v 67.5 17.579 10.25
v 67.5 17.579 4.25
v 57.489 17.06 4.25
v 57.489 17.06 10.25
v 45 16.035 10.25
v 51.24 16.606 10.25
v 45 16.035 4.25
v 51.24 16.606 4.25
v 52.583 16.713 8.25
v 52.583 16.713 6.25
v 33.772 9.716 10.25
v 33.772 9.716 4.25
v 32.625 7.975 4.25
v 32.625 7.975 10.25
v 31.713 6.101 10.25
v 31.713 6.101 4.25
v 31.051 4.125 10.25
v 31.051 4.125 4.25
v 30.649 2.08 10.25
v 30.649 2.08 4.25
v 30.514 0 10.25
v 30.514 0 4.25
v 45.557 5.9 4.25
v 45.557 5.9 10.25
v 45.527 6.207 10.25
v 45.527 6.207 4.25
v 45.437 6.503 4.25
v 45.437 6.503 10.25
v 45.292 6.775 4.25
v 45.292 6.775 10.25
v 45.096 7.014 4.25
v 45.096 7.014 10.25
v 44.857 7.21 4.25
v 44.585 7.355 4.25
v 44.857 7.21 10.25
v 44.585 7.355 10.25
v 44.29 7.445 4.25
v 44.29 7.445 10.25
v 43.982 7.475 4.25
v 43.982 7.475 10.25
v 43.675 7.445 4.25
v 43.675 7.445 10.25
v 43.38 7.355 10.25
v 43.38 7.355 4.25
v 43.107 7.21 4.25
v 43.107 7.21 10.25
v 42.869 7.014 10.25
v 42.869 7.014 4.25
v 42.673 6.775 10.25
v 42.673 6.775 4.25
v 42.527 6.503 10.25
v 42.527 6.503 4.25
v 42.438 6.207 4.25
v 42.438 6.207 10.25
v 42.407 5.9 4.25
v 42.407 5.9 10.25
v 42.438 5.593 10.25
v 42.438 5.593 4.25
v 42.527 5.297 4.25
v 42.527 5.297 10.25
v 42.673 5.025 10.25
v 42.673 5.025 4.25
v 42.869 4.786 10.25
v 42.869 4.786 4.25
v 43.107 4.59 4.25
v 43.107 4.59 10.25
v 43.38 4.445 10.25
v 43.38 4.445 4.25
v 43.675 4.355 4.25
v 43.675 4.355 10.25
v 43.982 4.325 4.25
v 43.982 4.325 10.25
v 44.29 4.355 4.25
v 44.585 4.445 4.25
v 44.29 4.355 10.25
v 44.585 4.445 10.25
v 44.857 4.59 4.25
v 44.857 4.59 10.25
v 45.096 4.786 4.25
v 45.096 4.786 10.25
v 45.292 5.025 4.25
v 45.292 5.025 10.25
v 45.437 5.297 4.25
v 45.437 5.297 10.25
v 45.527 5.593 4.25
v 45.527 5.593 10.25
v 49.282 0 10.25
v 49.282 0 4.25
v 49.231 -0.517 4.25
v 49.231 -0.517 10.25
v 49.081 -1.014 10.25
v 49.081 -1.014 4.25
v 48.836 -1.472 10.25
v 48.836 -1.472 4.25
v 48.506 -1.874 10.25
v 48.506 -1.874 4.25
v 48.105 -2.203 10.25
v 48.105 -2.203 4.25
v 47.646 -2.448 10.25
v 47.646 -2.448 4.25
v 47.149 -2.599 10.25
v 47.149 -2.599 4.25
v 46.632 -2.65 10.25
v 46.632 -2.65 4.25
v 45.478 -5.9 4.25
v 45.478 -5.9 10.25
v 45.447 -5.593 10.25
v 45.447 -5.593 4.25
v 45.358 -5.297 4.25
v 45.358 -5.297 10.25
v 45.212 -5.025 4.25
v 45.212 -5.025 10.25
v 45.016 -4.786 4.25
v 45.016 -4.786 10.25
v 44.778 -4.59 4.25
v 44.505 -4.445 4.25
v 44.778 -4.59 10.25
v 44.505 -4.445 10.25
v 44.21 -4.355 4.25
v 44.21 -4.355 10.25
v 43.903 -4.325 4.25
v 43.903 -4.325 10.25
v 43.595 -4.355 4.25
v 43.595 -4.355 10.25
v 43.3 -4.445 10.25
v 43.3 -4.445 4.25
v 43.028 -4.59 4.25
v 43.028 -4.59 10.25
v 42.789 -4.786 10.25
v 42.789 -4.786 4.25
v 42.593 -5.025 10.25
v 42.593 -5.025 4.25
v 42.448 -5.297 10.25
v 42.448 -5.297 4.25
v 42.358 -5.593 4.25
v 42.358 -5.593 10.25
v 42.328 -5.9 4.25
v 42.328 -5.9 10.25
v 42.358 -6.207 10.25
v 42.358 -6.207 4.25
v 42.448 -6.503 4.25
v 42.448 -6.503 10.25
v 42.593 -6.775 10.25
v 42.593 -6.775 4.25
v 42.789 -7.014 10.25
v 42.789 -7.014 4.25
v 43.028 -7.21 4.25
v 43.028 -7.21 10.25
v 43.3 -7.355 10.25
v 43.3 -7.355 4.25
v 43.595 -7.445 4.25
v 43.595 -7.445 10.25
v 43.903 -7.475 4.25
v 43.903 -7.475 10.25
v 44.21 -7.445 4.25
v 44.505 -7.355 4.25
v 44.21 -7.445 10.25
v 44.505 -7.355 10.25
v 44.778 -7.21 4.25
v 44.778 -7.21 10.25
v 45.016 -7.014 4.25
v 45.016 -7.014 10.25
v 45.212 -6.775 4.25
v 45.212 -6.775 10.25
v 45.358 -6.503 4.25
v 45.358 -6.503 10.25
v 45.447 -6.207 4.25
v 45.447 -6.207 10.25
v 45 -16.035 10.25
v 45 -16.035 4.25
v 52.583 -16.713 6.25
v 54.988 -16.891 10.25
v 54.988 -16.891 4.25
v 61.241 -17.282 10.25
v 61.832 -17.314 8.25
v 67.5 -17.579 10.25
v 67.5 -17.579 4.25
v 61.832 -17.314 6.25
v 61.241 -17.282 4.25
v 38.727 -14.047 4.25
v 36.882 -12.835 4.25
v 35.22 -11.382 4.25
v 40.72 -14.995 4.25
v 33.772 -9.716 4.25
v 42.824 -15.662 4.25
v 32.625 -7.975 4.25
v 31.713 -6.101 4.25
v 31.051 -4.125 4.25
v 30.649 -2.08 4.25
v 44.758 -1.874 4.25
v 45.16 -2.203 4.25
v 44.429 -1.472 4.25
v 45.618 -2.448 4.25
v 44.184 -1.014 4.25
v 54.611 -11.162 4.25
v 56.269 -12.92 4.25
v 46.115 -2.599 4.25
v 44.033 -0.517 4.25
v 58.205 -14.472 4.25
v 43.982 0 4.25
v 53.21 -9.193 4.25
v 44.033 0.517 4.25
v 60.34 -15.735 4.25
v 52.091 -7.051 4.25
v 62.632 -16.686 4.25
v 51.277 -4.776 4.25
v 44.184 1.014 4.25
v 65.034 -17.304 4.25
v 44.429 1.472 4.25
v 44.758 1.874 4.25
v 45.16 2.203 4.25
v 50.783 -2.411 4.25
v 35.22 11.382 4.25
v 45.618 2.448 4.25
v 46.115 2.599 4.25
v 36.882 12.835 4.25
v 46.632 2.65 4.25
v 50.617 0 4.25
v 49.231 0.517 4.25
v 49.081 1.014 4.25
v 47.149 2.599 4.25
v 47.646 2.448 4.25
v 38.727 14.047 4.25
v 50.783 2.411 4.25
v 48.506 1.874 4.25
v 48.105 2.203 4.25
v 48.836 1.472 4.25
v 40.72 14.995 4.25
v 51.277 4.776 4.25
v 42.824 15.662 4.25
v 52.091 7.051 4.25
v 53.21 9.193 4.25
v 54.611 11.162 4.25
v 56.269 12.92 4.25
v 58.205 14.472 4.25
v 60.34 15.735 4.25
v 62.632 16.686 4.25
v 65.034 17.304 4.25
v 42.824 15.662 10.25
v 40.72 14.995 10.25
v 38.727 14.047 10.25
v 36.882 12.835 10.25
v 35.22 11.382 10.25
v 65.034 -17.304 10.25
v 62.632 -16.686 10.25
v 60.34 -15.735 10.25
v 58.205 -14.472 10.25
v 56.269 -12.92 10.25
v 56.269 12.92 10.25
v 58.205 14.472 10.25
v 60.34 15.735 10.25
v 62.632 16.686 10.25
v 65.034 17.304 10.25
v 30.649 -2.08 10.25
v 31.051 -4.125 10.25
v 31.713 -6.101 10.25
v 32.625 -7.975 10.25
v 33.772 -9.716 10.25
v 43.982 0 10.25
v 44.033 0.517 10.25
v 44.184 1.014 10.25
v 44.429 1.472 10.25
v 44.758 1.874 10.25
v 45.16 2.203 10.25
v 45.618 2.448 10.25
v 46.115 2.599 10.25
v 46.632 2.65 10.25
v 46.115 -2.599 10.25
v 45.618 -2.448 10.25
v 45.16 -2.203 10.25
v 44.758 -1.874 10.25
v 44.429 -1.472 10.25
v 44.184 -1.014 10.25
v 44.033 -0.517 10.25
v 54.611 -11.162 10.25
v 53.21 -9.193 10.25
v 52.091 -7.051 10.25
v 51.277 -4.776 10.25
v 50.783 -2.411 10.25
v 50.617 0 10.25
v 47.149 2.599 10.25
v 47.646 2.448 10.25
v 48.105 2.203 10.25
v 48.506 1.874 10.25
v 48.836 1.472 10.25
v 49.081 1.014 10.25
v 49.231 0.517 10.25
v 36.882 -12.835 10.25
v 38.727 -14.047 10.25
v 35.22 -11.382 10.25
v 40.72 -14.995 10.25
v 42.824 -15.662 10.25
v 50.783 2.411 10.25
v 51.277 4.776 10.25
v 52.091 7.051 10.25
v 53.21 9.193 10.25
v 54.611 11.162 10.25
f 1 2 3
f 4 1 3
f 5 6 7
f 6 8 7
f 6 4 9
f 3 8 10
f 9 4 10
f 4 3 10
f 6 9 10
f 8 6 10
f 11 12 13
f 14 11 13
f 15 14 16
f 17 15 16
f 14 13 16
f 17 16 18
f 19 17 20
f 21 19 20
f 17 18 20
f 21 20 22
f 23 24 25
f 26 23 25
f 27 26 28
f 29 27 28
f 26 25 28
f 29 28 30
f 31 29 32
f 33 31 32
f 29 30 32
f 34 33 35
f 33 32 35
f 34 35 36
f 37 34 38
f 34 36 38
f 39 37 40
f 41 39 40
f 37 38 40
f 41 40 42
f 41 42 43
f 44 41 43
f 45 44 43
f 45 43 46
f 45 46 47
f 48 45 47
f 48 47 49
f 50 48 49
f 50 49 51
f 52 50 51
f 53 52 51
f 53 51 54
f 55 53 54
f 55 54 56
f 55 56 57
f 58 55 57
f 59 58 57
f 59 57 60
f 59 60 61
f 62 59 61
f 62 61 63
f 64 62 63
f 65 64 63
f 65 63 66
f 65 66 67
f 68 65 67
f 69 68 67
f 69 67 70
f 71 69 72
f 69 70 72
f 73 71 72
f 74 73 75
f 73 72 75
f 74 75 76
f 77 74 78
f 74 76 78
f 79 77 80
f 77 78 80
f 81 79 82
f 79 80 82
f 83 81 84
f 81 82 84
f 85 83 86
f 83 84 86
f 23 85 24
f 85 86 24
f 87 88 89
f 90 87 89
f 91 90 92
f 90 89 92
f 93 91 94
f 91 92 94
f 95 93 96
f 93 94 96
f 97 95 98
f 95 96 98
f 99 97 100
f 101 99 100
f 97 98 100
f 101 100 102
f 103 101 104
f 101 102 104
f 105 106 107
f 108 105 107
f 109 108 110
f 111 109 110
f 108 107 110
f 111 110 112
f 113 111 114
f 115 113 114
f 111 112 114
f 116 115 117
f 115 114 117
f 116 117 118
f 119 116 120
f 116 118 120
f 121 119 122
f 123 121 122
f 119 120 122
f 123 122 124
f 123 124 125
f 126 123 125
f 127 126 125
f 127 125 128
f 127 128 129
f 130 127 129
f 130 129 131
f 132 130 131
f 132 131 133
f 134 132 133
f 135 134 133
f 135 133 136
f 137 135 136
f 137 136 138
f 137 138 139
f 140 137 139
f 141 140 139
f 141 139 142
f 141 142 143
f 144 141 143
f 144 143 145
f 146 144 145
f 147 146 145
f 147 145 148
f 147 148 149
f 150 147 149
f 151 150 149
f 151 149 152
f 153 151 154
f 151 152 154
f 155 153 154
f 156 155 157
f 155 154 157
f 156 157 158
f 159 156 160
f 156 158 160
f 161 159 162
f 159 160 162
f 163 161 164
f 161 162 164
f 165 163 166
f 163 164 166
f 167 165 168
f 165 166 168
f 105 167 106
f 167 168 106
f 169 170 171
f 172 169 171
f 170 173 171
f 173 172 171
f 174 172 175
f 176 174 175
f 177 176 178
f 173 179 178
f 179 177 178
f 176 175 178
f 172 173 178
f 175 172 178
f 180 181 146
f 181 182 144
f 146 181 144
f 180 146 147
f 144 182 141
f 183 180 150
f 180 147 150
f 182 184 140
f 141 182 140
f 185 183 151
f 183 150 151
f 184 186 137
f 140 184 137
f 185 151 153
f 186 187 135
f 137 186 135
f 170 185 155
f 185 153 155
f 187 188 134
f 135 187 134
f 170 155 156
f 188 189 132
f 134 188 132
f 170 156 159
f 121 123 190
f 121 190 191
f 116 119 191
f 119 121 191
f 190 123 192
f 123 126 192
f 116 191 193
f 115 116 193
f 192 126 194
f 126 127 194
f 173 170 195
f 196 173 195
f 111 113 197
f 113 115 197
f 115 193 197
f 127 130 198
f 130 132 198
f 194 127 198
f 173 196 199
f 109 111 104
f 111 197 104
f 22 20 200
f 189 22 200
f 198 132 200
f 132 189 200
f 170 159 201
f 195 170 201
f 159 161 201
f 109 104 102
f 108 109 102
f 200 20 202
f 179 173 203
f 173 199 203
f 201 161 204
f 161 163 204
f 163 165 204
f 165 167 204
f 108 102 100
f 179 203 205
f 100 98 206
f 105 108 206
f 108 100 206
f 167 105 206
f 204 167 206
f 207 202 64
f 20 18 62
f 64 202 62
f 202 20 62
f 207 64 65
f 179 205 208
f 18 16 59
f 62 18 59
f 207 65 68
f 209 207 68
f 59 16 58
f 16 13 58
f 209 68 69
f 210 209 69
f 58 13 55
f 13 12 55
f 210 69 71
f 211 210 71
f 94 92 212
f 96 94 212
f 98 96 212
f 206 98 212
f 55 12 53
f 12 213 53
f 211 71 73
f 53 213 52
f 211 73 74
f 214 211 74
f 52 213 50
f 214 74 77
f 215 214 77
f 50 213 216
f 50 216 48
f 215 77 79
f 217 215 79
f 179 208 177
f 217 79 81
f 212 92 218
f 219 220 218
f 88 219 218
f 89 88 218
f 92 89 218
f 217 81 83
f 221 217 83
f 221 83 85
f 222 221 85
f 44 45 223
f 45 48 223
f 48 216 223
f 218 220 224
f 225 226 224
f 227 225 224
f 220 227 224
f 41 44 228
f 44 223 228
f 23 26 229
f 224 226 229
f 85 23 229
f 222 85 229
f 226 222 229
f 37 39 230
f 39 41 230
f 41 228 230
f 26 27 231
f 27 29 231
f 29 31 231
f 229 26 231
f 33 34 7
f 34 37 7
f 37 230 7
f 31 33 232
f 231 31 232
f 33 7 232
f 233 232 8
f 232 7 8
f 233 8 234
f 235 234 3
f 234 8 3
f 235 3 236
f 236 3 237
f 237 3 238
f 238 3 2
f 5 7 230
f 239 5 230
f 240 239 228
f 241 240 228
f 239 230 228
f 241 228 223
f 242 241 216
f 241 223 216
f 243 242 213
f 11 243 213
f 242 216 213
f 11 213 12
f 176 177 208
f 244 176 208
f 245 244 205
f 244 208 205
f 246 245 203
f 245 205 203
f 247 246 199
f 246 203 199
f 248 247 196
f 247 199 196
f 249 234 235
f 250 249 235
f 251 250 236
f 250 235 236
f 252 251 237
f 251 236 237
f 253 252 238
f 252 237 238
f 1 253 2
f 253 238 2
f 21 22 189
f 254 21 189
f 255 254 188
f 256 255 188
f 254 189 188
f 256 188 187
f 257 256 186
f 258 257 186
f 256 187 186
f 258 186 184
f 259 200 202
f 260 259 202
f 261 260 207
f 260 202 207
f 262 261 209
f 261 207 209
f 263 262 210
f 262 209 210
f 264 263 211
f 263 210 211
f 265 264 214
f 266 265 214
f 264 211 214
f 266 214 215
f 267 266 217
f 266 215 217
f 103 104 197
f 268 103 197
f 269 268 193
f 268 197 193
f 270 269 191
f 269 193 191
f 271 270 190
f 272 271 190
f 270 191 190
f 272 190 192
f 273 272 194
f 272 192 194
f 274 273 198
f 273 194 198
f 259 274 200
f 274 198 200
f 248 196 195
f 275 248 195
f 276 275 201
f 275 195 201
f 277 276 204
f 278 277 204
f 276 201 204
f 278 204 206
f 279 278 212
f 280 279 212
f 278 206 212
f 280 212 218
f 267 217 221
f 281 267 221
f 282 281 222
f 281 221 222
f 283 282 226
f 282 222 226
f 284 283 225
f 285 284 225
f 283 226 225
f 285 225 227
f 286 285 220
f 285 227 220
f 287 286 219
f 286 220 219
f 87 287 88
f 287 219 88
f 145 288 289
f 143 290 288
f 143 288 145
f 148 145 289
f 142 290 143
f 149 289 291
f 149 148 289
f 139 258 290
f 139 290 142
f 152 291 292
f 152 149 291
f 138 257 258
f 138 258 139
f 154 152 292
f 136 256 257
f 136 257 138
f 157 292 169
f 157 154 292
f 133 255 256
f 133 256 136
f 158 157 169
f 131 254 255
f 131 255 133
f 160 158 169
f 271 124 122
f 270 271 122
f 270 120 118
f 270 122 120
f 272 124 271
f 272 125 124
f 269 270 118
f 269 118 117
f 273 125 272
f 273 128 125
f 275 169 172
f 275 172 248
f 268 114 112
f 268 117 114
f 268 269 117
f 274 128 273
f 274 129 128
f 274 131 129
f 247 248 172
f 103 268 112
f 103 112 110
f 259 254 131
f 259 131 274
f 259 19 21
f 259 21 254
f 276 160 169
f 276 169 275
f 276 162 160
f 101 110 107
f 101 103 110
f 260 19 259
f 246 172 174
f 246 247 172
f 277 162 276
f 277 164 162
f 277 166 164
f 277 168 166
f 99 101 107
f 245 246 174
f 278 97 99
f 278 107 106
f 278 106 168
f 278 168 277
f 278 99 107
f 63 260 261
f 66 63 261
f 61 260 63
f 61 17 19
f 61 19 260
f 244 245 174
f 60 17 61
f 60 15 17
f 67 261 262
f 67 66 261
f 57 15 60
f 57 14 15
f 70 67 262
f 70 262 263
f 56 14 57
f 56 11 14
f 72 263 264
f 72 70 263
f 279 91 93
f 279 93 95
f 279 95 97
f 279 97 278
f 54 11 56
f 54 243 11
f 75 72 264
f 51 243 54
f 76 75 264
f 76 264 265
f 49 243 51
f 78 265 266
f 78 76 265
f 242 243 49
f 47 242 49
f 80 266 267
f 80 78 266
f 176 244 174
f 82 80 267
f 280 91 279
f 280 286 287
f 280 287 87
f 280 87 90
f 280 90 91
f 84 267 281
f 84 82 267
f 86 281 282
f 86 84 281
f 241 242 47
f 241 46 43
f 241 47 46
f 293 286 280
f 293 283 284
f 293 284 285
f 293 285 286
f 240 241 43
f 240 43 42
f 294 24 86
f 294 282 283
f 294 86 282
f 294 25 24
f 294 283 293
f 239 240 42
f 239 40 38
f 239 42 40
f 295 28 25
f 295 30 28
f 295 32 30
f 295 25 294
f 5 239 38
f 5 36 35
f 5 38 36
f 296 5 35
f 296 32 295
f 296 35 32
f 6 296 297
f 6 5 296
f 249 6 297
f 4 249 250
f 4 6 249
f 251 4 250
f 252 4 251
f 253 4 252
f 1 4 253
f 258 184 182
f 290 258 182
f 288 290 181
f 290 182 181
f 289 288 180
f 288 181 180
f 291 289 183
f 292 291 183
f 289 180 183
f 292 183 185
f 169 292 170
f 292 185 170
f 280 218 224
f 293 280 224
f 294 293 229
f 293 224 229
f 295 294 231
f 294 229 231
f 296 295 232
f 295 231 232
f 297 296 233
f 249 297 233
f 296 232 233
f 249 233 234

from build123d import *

# Parameters (mm, degrees)
BOSS_EXTRUDE3_START = 4.25
BOSS_EXTRUDE3_DEPTH = 6
SKETCH3_R           = 1.575
CUT_EXTRUDE1_DEPTH  = 10


with BuildPart() as part:
    # Sketch2 → Boss-Extrude3 (new body)
    with BuildSketch(Plane.XY.offset(BOSS_EXTRUDE3_START)):
        with BuildLine():
            ThreePointArc((46.632238895, 16.118255038), (45.815068573, 16.097527081), (45, 16.035396523))
            ThreePointArc((45, 16.035396523), (38.72701102, 14.046548248), (33.771749201, 9.716272448))
            ThreePointArc((33.771749201, 9.716272448), (37.029755518, 5.335725192), (38.184673742, 0))
            Line((38.184673742, 0), (43.982238895, 0))
            ThreePointArc((43.982238895, 0), (44.758405925, 1.87383297), (46.632238895, 2.65))
            Line((46.632238895, 2.65), (46.632238895, 16.118255038))
        make_face()
        with BuildLine():
            ThreePointArc((33.771749201, -9.716272448), (38.72701102, -14.046548248), (45, -16.035396523))
            ThreePointArc((45, -16.035396523), (45.815068573, -16.097527081), (46.632238895, -16.118255038))
            Line((46.632238895, -16.118255038), (46.632238895, -2.65))
            ThreePointArc((46.632238895, -2.65), (44.758405925, -1.87383297), (43.982238895, 0))
            Line((43.982238895, 0), (38.184673742, 0))
            ThreePointArc((38.184673742, 0), (37.029755518, -5.335725192), (33.771749201, -9.716272448))
        make_face()
        with BuildLine():
            ThreePointArc((38.184673742, 0), (37.029755518, 5.335725192), (33.771749201, 9.716272448))
            ThreePointArc((33.771749201, 9.716272448), (31.350112109, 5.123938556), (30.513983858, 0))
            Line((30.513983858, 0), (38.184673742, 0))
        make_face()
        with BuildLine():
            ThreePointArc((30.513983858, 0), (31.350112109, -5.123938556), (33.771749201, -9.716272448))
            ThreePointArc((33.771749201, -9.716272448), (37.029755518, -5.335725192), (38.184673742, 0))
            Line((38.184673742, 0), (30.513983858, 0))
        make_face()
        with BuildLine():
            ThreePointArc((56.268821721, 12.920310248), (51.708915452, 15.297892031), (46.632238895, 16.118255038))
            Line((46.632238895, 16.118255038), (46.632238895, 2.65))
            ThreePointArc((46.632238895, 2.65), (48.506071865, 1.87383297), (49.282238895, 0))
            Line((49.282238895, 0), (50.616596945, 0))
            ThreePointArc((50.616596945, 0), (52.091474062, 7.051277576), (56.268821721, 12.920310248))
        make_face()
        with BuildLine():
            Line((46.632238895, -2.65), (46.632238895, -16.118255038))
            ThreePointArc((46.632238895, -16.118255038), (51.708915452, -15.297892031), (56.268821721, -12.920310248))
            ThreePointArc((56.268821721, -12.920310248), (52.091474062, -7.051277576), (50.616596945, 0))
            Line((50.616596945, 0), (49.282238895, 0))
            ThreePointArc((49.282238895, 0), (48.506071865, -1.87383297), (46.632238895, -2.65))
        make_face()
        with BuildLine():
            add(Edge.make_bspline(
                [(67.5, 17.578928476), (65.61016752, 17.502615465), (60.634413429, 17.271238409), (53.13057404, 16.789010877), (47.524682176, 16.292383273), (45, 16.035396523)],
                knots=[0.381536428, 0.381536428, 0.381536428, 0.381536428, 0.390812303, 0.405965006, 0.418410632, 0.418410632, 0.418410632, 0.418410632], degree=3))
            ThreePointArc((45, 16.035396523), (45.815068573, 16.097527081), (46.632238895, 16.118255038))
            ThreePointArc((46.632238895, 16.118255038), (51.708915452, 15.297892031), (56.268821721, 12.920310248))
            ThreePointArc((56.268821721, 12.920310248), (61.469163108, 16.250714817), (67.5, 17.578928476))
        make_face()
        with BuildLine():
            ThreePointArc((46.632238895, -16.118255038), (45.815068573, -16.097527081), (45, -16.035396523))
            add(Edge.make_bspline(
                [(45, -16.035396523), (47.524682176, -16.292383273), (53.13057404, -16.789010877), (60.634413429, -17.271238409), (65.61016752, -17.502615465), (67.5, -17.578928476)],
                knots=[0.581589368, 0.581589368, 0.581589368, 0.581589368, 0.594034994, 0.609187697, 0.618463572, 0.618463572, 0.618463572, 0.618463572], degree=3))
            ThreePointArc((67.5, -17.578928476), (61.469163108, -16.250714817), (56.268821721, -12.920310248))
            ThreePointArc((56.268821721, -12.920310248), (51.708915452, -15.297892031), (46.632238895, -16.118255038))
        make_face()
    extrude(amount=BOSS_EXTRUDE3_DEPTH)

    # Sketch3 → Cut-Extrude1 (cut)
    with BuildSketch(Plane.XY.offset(10.25)):
        with Locations((43.902744235, -5.9)):
            Circle(SKETCH3_R)
        with Locations((43.982238895, 5.9)):
            Circle(SKETCH3_R)
    extrude(amount=-CUT_EXTRUDE1_DEPTH, mode=Mode.SUBTRACT)


solid = part.part
